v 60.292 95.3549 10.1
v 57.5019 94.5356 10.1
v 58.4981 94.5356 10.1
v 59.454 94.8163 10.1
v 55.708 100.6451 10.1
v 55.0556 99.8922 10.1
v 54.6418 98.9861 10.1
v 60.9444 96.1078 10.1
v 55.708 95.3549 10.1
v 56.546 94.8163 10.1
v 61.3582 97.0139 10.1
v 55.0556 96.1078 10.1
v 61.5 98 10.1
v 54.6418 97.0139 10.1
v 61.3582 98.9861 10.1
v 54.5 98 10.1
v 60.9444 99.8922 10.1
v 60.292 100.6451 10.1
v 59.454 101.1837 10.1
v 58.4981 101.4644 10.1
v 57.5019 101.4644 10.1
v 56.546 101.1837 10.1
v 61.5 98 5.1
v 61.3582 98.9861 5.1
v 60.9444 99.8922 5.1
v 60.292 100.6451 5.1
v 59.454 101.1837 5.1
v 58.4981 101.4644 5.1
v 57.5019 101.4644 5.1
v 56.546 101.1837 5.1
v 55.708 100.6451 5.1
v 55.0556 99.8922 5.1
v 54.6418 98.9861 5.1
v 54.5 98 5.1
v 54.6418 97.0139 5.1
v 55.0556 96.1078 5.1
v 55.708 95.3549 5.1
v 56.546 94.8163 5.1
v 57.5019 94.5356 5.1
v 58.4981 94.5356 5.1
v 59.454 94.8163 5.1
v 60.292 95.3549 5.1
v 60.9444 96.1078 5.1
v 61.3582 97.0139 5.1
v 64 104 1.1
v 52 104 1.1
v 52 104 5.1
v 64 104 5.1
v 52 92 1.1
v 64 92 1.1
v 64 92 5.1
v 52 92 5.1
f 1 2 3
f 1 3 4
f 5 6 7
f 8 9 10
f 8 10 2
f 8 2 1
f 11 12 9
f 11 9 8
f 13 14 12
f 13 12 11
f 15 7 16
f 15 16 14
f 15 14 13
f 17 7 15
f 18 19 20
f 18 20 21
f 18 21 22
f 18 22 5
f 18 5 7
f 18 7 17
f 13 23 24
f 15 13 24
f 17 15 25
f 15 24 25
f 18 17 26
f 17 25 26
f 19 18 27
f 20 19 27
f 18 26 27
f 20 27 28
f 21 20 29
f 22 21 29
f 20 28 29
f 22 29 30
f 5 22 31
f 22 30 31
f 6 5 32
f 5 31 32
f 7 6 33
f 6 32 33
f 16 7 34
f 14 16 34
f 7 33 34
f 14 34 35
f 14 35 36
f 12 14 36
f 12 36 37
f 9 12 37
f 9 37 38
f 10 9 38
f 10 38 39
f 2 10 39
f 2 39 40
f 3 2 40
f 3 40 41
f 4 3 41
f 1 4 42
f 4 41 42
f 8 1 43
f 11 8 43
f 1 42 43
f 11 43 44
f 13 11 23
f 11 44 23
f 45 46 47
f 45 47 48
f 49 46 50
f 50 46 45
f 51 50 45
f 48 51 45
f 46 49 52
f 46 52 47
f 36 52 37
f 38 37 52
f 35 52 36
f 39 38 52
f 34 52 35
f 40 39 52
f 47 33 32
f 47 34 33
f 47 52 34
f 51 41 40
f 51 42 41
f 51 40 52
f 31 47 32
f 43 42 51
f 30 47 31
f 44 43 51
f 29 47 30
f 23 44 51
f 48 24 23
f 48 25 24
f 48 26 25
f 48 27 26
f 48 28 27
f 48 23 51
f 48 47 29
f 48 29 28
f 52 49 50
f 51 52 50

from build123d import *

# Parameters (mm, degrees)
BOX009_W          = 12
BOX009_H          = 12
BOX009_DEPTH      = 4
CYLINDER003_R     = 3.5
CYLINDER003_DEPTH = 5


with BuildPart() as butbase:
    # Box009 → Box009 (new body)
    with BuildSketch(Plane.XY):
        with Locations((6, 6)):
            Rectangle(BOX009_W, BOX009_H)
    extrude(amount=BOX009_DEPTH)


with BuildPart() as button:
    # Cylinder003 → Cylinder003 (new body)
    with BuildSketch(Plane(origin=(6, 6, 4), x_dir=(1, 0, 0), z_dir=(0, 0, 1))):
        Circle(CYLINDER003_R)
    extrude(amount=CYLINDER003_DEPTH)

    # Fusion001: union butbase
    add(butbase.part)


with BuildPart() as button_1:
    # Fusion001 placement: moved
    add(button.part.moved(Location((52, 92, 1.1))))


solid = button_1.part
